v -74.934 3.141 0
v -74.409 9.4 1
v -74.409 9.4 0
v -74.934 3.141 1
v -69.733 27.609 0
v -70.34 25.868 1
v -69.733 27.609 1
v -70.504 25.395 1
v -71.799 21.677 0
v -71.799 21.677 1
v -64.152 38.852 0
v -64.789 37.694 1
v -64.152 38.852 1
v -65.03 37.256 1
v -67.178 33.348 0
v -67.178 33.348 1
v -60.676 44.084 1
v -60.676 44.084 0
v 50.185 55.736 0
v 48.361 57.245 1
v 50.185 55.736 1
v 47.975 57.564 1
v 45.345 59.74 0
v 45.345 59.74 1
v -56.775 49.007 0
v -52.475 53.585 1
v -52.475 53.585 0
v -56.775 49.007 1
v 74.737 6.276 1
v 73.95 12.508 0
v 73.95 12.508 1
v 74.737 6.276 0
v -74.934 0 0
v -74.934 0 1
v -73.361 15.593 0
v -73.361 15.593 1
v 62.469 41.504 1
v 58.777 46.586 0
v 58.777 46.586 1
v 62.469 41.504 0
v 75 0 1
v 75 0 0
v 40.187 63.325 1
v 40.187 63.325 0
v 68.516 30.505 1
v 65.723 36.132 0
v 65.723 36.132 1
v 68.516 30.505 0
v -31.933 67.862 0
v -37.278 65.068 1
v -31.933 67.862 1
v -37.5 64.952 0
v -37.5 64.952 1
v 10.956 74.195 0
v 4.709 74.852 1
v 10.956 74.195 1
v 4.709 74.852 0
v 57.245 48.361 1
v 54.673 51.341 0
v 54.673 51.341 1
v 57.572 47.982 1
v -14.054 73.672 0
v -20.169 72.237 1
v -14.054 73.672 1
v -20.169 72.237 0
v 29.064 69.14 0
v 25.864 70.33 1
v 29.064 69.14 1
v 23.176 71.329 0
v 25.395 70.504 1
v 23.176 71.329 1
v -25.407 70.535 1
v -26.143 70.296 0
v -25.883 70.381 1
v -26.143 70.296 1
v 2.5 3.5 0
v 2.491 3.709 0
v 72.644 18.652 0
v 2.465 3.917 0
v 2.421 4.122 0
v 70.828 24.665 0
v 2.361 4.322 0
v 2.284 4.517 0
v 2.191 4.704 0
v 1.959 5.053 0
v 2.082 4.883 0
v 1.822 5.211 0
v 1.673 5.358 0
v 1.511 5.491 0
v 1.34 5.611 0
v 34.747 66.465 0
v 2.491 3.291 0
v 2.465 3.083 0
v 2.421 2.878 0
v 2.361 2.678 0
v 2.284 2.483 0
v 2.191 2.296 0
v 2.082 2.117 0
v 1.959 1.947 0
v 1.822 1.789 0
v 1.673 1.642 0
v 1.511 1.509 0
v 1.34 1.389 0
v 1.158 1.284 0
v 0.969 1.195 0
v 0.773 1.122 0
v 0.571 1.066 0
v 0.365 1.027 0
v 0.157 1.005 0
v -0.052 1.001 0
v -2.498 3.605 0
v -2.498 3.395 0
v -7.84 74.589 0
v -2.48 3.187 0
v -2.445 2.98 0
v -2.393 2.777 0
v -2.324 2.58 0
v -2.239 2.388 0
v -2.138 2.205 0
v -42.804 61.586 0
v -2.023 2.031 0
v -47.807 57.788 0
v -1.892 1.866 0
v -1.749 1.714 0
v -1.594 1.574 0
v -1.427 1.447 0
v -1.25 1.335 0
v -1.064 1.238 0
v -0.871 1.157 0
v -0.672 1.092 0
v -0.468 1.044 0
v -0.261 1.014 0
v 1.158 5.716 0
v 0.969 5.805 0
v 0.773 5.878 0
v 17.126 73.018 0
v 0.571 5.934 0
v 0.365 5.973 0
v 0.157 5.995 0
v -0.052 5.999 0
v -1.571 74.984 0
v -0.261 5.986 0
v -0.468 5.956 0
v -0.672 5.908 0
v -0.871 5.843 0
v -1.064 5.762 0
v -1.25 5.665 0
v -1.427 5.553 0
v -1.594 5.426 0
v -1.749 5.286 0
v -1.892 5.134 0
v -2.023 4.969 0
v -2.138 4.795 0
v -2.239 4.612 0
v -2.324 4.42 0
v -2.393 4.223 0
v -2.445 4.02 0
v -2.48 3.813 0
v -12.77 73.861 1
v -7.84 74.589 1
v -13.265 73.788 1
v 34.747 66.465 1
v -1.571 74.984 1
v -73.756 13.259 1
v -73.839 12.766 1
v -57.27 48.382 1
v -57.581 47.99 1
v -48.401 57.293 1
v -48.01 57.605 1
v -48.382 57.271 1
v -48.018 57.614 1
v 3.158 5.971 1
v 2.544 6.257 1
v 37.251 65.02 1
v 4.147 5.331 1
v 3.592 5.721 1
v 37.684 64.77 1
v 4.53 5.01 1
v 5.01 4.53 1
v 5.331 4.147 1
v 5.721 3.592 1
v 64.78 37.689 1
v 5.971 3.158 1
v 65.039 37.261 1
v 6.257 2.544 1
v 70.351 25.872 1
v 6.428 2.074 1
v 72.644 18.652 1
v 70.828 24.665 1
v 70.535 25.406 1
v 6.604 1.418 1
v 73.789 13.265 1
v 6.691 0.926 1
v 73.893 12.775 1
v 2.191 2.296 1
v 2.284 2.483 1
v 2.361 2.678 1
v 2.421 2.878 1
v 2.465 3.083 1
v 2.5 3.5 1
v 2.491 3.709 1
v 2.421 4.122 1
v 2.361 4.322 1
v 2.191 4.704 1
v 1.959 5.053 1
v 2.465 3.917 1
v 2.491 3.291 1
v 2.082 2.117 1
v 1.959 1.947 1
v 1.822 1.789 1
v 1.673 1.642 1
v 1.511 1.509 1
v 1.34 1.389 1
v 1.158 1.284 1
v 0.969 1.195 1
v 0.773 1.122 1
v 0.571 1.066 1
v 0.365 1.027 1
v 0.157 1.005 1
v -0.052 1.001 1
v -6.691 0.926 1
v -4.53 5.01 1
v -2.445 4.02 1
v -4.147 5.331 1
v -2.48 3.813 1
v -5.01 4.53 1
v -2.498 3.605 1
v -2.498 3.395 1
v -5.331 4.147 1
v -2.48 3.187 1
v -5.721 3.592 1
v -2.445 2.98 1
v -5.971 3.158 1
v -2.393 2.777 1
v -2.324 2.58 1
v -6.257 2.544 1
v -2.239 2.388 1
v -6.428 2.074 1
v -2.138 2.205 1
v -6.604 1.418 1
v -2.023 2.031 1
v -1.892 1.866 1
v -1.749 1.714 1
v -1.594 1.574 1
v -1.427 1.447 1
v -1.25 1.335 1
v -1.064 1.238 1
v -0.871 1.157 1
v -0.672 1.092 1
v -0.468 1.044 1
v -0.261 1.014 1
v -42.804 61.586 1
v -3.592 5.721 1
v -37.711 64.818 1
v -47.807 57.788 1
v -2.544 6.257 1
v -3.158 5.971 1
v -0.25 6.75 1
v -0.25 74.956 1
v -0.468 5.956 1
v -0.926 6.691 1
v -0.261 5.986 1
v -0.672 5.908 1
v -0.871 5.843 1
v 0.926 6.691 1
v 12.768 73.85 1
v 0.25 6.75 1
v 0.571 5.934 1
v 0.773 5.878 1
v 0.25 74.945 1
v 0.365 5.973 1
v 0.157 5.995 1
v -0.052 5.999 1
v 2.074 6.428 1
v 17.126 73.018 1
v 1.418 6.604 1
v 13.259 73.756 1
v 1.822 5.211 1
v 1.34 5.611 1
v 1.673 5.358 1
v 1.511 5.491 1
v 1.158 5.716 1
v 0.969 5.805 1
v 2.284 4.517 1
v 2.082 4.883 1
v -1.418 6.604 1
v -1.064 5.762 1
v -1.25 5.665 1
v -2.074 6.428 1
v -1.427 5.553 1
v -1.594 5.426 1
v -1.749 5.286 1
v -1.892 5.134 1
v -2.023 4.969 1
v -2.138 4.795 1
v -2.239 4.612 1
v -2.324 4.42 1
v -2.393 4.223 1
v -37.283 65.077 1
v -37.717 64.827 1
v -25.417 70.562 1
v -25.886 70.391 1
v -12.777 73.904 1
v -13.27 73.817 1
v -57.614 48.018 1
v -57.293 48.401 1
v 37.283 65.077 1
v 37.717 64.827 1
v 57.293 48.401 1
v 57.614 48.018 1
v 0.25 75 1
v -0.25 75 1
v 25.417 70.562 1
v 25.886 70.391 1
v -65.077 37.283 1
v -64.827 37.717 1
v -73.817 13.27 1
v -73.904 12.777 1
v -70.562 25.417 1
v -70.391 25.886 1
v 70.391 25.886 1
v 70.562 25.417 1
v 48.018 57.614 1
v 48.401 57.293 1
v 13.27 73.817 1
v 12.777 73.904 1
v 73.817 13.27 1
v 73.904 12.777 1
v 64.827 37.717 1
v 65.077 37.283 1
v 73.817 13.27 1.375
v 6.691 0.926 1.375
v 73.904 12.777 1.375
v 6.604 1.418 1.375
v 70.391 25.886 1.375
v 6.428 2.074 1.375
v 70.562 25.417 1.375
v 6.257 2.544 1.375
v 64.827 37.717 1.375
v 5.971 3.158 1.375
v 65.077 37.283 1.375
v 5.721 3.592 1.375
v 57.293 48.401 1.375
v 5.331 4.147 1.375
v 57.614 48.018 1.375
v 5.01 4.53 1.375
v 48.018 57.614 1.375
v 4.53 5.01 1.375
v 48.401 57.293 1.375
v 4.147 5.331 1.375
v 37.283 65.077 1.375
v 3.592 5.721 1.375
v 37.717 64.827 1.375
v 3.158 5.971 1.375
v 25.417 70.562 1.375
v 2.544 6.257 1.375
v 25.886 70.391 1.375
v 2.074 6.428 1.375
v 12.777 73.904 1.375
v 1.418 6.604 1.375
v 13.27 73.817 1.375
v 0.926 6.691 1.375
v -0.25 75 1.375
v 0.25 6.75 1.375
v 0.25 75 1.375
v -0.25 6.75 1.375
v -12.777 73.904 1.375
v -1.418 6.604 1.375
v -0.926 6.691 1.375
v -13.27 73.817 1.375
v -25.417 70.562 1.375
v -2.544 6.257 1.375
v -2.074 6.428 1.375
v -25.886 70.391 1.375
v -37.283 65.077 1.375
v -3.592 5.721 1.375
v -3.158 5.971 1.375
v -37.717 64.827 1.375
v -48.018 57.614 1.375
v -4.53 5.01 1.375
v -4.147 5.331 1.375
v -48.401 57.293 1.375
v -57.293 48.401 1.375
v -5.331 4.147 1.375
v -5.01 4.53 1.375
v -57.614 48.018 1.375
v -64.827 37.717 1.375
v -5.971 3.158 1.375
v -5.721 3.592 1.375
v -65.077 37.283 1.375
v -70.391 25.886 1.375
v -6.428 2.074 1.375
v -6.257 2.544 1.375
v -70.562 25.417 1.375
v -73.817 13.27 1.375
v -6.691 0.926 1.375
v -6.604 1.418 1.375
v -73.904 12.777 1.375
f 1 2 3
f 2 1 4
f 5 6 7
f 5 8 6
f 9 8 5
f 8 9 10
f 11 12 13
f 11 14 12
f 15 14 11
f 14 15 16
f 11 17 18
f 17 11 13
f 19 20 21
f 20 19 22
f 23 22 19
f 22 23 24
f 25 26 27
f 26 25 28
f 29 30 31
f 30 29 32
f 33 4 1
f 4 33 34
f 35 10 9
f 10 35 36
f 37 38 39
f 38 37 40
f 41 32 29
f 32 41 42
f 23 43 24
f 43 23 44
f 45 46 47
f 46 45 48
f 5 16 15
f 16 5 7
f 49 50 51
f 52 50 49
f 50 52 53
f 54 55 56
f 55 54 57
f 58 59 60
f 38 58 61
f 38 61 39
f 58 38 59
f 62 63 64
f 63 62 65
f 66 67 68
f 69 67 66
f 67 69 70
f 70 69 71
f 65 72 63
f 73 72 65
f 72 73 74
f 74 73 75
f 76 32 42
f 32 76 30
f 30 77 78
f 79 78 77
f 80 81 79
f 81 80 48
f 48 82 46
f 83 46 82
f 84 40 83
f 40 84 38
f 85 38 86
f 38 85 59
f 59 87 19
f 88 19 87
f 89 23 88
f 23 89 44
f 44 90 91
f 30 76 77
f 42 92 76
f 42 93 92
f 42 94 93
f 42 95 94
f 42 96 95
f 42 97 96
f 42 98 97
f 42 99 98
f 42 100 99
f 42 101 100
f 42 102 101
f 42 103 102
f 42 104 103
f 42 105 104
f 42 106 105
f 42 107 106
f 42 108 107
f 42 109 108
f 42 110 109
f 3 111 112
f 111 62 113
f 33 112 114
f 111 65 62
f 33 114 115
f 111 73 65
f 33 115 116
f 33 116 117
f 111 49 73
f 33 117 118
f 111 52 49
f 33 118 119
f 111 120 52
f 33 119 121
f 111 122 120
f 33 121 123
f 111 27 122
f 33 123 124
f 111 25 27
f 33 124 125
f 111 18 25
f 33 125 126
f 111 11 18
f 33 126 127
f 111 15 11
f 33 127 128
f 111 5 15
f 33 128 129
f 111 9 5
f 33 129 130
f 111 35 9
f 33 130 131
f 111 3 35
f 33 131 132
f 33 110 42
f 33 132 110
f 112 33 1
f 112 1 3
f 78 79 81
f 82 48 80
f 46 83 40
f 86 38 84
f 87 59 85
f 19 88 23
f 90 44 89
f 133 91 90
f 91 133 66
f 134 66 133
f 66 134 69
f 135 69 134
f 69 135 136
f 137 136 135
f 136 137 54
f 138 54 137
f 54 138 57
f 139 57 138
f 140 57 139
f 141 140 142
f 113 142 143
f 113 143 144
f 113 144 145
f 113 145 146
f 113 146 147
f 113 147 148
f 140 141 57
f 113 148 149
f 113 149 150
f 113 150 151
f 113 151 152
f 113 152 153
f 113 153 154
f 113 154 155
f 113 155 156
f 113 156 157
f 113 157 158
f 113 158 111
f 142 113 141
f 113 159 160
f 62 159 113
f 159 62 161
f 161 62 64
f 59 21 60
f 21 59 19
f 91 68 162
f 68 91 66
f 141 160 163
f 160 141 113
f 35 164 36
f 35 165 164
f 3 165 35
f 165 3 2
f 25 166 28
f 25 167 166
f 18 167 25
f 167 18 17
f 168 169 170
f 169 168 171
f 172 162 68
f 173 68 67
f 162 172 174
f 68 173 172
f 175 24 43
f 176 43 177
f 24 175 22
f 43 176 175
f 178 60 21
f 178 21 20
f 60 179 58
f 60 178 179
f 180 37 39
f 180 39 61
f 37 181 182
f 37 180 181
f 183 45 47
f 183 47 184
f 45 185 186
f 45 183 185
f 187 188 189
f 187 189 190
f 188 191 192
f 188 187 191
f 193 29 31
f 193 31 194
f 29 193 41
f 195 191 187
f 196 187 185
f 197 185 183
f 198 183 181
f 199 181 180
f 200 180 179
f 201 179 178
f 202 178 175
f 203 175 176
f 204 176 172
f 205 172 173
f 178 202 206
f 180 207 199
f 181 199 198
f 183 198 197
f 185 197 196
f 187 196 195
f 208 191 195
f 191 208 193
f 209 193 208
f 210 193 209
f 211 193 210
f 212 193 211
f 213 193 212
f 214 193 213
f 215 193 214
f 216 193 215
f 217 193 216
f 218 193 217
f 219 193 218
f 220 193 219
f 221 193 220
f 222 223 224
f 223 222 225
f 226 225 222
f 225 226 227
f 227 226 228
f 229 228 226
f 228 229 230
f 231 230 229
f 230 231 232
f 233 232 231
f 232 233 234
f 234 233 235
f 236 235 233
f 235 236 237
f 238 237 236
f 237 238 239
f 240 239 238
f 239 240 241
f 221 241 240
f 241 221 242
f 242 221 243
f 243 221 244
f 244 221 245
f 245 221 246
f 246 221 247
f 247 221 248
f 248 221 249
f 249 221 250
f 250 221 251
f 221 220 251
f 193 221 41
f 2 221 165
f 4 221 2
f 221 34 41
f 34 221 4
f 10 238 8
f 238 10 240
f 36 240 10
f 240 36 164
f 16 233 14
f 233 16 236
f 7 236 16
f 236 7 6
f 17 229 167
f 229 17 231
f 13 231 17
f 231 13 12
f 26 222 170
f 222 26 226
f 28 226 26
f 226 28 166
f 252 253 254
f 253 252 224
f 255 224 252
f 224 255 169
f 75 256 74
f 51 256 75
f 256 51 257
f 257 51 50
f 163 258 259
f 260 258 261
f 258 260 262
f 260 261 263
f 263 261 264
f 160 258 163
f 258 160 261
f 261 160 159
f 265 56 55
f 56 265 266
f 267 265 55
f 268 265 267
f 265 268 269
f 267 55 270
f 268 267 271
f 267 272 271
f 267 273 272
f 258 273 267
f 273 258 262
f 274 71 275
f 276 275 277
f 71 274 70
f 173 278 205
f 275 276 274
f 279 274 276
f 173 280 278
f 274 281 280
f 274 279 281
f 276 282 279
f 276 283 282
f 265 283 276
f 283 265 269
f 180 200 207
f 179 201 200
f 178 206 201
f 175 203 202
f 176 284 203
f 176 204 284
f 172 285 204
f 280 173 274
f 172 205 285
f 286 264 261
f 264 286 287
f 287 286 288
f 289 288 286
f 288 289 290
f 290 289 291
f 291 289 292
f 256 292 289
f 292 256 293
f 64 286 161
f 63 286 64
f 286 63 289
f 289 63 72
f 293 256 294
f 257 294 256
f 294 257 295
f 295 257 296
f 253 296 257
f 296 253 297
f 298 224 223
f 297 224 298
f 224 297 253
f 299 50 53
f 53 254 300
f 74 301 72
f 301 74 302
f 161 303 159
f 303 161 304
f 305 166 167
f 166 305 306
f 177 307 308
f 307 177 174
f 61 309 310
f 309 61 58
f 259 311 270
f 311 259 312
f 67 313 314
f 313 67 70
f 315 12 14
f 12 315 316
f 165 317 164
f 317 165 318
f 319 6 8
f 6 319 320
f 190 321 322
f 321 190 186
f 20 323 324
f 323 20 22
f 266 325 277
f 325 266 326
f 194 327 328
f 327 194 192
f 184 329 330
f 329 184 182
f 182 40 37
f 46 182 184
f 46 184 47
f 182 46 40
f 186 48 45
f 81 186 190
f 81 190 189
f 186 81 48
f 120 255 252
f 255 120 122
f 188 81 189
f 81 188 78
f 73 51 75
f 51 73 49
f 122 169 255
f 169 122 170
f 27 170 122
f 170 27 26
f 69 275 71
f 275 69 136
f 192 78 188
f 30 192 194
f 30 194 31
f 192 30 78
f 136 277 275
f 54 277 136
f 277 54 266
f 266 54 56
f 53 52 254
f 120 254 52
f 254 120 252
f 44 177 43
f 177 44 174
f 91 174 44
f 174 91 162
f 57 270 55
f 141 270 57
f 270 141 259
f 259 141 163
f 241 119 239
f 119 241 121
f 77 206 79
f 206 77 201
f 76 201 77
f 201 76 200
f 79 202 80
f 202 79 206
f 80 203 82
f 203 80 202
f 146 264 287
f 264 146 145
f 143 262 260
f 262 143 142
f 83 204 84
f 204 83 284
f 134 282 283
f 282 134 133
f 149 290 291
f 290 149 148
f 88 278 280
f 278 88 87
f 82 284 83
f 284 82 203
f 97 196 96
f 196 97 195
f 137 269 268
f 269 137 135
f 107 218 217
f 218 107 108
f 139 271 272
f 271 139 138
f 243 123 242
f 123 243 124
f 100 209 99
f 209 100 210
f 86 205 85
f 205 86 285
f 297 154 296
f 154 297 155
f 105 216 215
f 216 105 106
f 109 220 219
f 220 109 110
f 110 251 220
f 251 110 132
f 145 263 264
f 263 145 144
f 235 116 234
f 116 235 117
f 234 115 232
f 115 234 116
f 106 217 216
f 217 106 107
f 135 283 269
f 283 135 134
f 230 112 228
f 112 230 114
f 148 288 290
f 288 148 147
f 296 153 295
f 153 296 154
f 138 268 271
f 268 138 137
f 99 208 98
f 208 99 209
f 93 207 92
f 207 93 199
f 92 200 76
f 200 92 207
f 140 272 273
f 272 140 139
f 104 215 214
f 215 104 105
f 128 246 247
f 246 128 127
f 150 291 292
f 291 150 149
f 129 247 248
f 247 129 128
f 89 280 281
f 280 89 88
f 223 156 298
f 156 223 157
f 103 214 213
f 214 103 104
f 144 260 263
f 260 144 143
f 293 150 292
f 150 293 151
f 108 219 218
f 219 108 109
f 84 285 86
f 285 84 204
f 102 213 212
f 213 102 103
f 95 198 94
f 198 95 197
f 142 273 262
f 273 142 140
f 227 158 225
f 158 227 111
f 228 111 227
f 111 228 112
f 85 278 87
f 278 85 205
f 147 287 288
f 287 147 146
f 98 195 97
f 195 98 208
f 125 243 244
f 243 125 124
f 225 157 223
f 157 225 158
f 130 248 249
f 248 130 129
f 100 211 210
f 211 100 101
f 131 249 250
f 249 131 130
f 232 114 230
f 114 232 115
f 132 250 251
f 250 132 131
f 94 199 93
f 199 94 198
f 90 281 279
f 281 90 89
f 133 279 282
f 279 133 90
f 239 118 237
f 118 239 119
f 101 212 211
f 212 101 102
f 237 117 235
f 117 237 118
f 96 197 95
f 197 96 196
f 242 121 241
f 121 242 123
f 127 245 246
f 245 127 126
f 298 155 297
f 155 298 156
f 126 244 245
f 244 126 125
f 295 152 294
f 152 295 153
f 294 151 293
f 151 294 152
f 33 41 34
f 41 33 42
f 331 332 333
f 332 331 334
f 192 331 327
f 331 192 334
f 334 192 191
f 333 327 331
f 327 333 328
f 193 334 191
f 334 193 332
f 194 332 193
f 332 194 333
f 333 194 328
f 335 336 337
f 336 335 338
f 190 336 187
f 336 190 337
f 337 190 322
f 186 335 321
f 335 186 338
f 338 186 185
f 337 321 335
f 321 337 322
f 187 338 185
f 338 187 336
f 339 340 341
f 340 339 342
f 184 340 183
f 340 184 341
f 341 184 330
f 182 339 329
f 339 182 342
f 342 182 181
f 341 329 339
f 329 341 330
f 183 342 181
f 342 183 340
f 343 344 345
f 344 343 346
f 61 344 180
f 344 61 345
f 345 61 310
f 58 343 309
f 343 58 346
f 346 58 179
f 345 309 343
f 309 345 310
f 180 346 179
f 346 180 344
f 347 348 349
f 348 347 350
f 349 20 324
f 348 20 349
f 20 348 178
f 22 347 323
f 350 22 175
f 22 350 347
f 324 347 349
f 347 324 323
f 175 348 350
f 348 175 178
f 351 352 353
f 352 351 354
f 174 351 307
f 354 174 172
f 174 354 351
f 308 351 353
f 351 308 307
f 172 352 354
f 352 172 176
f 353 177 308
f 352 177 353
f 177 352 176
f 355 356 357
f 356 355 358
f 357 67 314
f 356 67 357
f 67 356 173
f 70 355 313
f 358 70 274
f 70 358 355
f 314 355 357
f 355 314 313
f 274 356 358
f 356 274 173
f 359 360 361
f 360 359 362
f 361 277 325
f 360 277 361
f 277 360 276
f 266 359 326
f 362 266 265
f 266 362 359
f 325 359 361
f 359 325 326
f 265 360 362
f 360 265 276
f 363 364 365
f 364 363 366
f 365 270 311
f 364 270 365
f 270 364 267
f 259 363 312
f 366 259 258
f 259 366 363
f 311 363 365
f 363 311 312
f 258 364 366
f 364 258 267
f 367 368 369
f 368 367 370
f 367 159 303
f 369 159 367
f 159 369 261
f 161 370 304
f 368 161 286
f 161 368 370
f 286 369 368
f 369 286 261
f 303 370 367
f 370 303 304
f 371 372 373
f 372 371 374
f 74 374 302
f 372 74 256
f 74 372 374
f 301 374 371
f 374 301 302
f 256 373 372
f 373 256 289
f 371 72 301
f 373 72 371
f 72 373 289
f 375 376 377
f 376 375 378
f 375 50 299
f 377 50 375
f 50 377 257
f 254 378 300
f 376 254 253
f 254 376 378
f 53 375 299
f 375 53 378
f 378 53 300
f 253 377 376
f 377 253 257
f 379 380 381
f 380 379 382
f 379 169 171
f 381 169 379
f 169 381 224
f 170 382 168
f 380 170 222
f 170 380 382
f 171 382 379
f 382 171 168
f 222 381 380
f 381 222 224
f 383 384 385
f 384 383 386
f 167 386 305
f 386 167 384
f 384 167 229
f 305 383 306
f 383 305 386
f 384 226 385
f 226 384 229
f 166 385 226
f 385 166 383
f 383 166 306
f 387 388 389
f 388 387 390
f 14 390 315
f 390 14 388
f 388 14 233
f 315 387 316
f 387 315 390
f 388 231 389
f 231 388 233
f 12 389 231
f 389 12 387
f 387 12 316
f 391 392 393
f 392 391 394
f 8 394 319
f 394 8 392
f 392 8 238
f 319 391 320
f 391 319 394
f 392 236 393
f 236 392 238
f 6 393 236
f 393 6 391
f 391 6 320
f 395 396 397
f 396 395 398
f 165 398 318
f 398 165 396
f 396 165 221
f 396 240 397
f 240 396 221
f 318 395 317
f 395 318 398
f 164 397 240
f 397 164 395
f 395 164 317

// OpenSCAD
$fn = 75;
cm = 10;

width = 15*cm;
thickness = 1;

hole_d = .5*cm;
hole_offset = .35*cm;

difference() {
    linear_extrude(height=thickness) {
        circle(d=width);
    }

    // view hole
    translate([0, hole_offset, -1])
        cylinder(d=hole_d, h=3);

    translate([-(width/2), -(width/2),-1])
        cube([width,width/2,3]);
}

line_w = .5;
line_h = .375;
line_y = (hole_offset/2)+hole_d;

rotate([0,0,-90]) {
    angle_inc = 10;
    for (angle = [10:angle_inc:180-angle_inc]) {

        rotate([0,0,angle])
            translate([-(line_w/2), line_y, thickness])
                color("red") cube([line_w, (width/2)-line_y, line_h]);
    }
}
